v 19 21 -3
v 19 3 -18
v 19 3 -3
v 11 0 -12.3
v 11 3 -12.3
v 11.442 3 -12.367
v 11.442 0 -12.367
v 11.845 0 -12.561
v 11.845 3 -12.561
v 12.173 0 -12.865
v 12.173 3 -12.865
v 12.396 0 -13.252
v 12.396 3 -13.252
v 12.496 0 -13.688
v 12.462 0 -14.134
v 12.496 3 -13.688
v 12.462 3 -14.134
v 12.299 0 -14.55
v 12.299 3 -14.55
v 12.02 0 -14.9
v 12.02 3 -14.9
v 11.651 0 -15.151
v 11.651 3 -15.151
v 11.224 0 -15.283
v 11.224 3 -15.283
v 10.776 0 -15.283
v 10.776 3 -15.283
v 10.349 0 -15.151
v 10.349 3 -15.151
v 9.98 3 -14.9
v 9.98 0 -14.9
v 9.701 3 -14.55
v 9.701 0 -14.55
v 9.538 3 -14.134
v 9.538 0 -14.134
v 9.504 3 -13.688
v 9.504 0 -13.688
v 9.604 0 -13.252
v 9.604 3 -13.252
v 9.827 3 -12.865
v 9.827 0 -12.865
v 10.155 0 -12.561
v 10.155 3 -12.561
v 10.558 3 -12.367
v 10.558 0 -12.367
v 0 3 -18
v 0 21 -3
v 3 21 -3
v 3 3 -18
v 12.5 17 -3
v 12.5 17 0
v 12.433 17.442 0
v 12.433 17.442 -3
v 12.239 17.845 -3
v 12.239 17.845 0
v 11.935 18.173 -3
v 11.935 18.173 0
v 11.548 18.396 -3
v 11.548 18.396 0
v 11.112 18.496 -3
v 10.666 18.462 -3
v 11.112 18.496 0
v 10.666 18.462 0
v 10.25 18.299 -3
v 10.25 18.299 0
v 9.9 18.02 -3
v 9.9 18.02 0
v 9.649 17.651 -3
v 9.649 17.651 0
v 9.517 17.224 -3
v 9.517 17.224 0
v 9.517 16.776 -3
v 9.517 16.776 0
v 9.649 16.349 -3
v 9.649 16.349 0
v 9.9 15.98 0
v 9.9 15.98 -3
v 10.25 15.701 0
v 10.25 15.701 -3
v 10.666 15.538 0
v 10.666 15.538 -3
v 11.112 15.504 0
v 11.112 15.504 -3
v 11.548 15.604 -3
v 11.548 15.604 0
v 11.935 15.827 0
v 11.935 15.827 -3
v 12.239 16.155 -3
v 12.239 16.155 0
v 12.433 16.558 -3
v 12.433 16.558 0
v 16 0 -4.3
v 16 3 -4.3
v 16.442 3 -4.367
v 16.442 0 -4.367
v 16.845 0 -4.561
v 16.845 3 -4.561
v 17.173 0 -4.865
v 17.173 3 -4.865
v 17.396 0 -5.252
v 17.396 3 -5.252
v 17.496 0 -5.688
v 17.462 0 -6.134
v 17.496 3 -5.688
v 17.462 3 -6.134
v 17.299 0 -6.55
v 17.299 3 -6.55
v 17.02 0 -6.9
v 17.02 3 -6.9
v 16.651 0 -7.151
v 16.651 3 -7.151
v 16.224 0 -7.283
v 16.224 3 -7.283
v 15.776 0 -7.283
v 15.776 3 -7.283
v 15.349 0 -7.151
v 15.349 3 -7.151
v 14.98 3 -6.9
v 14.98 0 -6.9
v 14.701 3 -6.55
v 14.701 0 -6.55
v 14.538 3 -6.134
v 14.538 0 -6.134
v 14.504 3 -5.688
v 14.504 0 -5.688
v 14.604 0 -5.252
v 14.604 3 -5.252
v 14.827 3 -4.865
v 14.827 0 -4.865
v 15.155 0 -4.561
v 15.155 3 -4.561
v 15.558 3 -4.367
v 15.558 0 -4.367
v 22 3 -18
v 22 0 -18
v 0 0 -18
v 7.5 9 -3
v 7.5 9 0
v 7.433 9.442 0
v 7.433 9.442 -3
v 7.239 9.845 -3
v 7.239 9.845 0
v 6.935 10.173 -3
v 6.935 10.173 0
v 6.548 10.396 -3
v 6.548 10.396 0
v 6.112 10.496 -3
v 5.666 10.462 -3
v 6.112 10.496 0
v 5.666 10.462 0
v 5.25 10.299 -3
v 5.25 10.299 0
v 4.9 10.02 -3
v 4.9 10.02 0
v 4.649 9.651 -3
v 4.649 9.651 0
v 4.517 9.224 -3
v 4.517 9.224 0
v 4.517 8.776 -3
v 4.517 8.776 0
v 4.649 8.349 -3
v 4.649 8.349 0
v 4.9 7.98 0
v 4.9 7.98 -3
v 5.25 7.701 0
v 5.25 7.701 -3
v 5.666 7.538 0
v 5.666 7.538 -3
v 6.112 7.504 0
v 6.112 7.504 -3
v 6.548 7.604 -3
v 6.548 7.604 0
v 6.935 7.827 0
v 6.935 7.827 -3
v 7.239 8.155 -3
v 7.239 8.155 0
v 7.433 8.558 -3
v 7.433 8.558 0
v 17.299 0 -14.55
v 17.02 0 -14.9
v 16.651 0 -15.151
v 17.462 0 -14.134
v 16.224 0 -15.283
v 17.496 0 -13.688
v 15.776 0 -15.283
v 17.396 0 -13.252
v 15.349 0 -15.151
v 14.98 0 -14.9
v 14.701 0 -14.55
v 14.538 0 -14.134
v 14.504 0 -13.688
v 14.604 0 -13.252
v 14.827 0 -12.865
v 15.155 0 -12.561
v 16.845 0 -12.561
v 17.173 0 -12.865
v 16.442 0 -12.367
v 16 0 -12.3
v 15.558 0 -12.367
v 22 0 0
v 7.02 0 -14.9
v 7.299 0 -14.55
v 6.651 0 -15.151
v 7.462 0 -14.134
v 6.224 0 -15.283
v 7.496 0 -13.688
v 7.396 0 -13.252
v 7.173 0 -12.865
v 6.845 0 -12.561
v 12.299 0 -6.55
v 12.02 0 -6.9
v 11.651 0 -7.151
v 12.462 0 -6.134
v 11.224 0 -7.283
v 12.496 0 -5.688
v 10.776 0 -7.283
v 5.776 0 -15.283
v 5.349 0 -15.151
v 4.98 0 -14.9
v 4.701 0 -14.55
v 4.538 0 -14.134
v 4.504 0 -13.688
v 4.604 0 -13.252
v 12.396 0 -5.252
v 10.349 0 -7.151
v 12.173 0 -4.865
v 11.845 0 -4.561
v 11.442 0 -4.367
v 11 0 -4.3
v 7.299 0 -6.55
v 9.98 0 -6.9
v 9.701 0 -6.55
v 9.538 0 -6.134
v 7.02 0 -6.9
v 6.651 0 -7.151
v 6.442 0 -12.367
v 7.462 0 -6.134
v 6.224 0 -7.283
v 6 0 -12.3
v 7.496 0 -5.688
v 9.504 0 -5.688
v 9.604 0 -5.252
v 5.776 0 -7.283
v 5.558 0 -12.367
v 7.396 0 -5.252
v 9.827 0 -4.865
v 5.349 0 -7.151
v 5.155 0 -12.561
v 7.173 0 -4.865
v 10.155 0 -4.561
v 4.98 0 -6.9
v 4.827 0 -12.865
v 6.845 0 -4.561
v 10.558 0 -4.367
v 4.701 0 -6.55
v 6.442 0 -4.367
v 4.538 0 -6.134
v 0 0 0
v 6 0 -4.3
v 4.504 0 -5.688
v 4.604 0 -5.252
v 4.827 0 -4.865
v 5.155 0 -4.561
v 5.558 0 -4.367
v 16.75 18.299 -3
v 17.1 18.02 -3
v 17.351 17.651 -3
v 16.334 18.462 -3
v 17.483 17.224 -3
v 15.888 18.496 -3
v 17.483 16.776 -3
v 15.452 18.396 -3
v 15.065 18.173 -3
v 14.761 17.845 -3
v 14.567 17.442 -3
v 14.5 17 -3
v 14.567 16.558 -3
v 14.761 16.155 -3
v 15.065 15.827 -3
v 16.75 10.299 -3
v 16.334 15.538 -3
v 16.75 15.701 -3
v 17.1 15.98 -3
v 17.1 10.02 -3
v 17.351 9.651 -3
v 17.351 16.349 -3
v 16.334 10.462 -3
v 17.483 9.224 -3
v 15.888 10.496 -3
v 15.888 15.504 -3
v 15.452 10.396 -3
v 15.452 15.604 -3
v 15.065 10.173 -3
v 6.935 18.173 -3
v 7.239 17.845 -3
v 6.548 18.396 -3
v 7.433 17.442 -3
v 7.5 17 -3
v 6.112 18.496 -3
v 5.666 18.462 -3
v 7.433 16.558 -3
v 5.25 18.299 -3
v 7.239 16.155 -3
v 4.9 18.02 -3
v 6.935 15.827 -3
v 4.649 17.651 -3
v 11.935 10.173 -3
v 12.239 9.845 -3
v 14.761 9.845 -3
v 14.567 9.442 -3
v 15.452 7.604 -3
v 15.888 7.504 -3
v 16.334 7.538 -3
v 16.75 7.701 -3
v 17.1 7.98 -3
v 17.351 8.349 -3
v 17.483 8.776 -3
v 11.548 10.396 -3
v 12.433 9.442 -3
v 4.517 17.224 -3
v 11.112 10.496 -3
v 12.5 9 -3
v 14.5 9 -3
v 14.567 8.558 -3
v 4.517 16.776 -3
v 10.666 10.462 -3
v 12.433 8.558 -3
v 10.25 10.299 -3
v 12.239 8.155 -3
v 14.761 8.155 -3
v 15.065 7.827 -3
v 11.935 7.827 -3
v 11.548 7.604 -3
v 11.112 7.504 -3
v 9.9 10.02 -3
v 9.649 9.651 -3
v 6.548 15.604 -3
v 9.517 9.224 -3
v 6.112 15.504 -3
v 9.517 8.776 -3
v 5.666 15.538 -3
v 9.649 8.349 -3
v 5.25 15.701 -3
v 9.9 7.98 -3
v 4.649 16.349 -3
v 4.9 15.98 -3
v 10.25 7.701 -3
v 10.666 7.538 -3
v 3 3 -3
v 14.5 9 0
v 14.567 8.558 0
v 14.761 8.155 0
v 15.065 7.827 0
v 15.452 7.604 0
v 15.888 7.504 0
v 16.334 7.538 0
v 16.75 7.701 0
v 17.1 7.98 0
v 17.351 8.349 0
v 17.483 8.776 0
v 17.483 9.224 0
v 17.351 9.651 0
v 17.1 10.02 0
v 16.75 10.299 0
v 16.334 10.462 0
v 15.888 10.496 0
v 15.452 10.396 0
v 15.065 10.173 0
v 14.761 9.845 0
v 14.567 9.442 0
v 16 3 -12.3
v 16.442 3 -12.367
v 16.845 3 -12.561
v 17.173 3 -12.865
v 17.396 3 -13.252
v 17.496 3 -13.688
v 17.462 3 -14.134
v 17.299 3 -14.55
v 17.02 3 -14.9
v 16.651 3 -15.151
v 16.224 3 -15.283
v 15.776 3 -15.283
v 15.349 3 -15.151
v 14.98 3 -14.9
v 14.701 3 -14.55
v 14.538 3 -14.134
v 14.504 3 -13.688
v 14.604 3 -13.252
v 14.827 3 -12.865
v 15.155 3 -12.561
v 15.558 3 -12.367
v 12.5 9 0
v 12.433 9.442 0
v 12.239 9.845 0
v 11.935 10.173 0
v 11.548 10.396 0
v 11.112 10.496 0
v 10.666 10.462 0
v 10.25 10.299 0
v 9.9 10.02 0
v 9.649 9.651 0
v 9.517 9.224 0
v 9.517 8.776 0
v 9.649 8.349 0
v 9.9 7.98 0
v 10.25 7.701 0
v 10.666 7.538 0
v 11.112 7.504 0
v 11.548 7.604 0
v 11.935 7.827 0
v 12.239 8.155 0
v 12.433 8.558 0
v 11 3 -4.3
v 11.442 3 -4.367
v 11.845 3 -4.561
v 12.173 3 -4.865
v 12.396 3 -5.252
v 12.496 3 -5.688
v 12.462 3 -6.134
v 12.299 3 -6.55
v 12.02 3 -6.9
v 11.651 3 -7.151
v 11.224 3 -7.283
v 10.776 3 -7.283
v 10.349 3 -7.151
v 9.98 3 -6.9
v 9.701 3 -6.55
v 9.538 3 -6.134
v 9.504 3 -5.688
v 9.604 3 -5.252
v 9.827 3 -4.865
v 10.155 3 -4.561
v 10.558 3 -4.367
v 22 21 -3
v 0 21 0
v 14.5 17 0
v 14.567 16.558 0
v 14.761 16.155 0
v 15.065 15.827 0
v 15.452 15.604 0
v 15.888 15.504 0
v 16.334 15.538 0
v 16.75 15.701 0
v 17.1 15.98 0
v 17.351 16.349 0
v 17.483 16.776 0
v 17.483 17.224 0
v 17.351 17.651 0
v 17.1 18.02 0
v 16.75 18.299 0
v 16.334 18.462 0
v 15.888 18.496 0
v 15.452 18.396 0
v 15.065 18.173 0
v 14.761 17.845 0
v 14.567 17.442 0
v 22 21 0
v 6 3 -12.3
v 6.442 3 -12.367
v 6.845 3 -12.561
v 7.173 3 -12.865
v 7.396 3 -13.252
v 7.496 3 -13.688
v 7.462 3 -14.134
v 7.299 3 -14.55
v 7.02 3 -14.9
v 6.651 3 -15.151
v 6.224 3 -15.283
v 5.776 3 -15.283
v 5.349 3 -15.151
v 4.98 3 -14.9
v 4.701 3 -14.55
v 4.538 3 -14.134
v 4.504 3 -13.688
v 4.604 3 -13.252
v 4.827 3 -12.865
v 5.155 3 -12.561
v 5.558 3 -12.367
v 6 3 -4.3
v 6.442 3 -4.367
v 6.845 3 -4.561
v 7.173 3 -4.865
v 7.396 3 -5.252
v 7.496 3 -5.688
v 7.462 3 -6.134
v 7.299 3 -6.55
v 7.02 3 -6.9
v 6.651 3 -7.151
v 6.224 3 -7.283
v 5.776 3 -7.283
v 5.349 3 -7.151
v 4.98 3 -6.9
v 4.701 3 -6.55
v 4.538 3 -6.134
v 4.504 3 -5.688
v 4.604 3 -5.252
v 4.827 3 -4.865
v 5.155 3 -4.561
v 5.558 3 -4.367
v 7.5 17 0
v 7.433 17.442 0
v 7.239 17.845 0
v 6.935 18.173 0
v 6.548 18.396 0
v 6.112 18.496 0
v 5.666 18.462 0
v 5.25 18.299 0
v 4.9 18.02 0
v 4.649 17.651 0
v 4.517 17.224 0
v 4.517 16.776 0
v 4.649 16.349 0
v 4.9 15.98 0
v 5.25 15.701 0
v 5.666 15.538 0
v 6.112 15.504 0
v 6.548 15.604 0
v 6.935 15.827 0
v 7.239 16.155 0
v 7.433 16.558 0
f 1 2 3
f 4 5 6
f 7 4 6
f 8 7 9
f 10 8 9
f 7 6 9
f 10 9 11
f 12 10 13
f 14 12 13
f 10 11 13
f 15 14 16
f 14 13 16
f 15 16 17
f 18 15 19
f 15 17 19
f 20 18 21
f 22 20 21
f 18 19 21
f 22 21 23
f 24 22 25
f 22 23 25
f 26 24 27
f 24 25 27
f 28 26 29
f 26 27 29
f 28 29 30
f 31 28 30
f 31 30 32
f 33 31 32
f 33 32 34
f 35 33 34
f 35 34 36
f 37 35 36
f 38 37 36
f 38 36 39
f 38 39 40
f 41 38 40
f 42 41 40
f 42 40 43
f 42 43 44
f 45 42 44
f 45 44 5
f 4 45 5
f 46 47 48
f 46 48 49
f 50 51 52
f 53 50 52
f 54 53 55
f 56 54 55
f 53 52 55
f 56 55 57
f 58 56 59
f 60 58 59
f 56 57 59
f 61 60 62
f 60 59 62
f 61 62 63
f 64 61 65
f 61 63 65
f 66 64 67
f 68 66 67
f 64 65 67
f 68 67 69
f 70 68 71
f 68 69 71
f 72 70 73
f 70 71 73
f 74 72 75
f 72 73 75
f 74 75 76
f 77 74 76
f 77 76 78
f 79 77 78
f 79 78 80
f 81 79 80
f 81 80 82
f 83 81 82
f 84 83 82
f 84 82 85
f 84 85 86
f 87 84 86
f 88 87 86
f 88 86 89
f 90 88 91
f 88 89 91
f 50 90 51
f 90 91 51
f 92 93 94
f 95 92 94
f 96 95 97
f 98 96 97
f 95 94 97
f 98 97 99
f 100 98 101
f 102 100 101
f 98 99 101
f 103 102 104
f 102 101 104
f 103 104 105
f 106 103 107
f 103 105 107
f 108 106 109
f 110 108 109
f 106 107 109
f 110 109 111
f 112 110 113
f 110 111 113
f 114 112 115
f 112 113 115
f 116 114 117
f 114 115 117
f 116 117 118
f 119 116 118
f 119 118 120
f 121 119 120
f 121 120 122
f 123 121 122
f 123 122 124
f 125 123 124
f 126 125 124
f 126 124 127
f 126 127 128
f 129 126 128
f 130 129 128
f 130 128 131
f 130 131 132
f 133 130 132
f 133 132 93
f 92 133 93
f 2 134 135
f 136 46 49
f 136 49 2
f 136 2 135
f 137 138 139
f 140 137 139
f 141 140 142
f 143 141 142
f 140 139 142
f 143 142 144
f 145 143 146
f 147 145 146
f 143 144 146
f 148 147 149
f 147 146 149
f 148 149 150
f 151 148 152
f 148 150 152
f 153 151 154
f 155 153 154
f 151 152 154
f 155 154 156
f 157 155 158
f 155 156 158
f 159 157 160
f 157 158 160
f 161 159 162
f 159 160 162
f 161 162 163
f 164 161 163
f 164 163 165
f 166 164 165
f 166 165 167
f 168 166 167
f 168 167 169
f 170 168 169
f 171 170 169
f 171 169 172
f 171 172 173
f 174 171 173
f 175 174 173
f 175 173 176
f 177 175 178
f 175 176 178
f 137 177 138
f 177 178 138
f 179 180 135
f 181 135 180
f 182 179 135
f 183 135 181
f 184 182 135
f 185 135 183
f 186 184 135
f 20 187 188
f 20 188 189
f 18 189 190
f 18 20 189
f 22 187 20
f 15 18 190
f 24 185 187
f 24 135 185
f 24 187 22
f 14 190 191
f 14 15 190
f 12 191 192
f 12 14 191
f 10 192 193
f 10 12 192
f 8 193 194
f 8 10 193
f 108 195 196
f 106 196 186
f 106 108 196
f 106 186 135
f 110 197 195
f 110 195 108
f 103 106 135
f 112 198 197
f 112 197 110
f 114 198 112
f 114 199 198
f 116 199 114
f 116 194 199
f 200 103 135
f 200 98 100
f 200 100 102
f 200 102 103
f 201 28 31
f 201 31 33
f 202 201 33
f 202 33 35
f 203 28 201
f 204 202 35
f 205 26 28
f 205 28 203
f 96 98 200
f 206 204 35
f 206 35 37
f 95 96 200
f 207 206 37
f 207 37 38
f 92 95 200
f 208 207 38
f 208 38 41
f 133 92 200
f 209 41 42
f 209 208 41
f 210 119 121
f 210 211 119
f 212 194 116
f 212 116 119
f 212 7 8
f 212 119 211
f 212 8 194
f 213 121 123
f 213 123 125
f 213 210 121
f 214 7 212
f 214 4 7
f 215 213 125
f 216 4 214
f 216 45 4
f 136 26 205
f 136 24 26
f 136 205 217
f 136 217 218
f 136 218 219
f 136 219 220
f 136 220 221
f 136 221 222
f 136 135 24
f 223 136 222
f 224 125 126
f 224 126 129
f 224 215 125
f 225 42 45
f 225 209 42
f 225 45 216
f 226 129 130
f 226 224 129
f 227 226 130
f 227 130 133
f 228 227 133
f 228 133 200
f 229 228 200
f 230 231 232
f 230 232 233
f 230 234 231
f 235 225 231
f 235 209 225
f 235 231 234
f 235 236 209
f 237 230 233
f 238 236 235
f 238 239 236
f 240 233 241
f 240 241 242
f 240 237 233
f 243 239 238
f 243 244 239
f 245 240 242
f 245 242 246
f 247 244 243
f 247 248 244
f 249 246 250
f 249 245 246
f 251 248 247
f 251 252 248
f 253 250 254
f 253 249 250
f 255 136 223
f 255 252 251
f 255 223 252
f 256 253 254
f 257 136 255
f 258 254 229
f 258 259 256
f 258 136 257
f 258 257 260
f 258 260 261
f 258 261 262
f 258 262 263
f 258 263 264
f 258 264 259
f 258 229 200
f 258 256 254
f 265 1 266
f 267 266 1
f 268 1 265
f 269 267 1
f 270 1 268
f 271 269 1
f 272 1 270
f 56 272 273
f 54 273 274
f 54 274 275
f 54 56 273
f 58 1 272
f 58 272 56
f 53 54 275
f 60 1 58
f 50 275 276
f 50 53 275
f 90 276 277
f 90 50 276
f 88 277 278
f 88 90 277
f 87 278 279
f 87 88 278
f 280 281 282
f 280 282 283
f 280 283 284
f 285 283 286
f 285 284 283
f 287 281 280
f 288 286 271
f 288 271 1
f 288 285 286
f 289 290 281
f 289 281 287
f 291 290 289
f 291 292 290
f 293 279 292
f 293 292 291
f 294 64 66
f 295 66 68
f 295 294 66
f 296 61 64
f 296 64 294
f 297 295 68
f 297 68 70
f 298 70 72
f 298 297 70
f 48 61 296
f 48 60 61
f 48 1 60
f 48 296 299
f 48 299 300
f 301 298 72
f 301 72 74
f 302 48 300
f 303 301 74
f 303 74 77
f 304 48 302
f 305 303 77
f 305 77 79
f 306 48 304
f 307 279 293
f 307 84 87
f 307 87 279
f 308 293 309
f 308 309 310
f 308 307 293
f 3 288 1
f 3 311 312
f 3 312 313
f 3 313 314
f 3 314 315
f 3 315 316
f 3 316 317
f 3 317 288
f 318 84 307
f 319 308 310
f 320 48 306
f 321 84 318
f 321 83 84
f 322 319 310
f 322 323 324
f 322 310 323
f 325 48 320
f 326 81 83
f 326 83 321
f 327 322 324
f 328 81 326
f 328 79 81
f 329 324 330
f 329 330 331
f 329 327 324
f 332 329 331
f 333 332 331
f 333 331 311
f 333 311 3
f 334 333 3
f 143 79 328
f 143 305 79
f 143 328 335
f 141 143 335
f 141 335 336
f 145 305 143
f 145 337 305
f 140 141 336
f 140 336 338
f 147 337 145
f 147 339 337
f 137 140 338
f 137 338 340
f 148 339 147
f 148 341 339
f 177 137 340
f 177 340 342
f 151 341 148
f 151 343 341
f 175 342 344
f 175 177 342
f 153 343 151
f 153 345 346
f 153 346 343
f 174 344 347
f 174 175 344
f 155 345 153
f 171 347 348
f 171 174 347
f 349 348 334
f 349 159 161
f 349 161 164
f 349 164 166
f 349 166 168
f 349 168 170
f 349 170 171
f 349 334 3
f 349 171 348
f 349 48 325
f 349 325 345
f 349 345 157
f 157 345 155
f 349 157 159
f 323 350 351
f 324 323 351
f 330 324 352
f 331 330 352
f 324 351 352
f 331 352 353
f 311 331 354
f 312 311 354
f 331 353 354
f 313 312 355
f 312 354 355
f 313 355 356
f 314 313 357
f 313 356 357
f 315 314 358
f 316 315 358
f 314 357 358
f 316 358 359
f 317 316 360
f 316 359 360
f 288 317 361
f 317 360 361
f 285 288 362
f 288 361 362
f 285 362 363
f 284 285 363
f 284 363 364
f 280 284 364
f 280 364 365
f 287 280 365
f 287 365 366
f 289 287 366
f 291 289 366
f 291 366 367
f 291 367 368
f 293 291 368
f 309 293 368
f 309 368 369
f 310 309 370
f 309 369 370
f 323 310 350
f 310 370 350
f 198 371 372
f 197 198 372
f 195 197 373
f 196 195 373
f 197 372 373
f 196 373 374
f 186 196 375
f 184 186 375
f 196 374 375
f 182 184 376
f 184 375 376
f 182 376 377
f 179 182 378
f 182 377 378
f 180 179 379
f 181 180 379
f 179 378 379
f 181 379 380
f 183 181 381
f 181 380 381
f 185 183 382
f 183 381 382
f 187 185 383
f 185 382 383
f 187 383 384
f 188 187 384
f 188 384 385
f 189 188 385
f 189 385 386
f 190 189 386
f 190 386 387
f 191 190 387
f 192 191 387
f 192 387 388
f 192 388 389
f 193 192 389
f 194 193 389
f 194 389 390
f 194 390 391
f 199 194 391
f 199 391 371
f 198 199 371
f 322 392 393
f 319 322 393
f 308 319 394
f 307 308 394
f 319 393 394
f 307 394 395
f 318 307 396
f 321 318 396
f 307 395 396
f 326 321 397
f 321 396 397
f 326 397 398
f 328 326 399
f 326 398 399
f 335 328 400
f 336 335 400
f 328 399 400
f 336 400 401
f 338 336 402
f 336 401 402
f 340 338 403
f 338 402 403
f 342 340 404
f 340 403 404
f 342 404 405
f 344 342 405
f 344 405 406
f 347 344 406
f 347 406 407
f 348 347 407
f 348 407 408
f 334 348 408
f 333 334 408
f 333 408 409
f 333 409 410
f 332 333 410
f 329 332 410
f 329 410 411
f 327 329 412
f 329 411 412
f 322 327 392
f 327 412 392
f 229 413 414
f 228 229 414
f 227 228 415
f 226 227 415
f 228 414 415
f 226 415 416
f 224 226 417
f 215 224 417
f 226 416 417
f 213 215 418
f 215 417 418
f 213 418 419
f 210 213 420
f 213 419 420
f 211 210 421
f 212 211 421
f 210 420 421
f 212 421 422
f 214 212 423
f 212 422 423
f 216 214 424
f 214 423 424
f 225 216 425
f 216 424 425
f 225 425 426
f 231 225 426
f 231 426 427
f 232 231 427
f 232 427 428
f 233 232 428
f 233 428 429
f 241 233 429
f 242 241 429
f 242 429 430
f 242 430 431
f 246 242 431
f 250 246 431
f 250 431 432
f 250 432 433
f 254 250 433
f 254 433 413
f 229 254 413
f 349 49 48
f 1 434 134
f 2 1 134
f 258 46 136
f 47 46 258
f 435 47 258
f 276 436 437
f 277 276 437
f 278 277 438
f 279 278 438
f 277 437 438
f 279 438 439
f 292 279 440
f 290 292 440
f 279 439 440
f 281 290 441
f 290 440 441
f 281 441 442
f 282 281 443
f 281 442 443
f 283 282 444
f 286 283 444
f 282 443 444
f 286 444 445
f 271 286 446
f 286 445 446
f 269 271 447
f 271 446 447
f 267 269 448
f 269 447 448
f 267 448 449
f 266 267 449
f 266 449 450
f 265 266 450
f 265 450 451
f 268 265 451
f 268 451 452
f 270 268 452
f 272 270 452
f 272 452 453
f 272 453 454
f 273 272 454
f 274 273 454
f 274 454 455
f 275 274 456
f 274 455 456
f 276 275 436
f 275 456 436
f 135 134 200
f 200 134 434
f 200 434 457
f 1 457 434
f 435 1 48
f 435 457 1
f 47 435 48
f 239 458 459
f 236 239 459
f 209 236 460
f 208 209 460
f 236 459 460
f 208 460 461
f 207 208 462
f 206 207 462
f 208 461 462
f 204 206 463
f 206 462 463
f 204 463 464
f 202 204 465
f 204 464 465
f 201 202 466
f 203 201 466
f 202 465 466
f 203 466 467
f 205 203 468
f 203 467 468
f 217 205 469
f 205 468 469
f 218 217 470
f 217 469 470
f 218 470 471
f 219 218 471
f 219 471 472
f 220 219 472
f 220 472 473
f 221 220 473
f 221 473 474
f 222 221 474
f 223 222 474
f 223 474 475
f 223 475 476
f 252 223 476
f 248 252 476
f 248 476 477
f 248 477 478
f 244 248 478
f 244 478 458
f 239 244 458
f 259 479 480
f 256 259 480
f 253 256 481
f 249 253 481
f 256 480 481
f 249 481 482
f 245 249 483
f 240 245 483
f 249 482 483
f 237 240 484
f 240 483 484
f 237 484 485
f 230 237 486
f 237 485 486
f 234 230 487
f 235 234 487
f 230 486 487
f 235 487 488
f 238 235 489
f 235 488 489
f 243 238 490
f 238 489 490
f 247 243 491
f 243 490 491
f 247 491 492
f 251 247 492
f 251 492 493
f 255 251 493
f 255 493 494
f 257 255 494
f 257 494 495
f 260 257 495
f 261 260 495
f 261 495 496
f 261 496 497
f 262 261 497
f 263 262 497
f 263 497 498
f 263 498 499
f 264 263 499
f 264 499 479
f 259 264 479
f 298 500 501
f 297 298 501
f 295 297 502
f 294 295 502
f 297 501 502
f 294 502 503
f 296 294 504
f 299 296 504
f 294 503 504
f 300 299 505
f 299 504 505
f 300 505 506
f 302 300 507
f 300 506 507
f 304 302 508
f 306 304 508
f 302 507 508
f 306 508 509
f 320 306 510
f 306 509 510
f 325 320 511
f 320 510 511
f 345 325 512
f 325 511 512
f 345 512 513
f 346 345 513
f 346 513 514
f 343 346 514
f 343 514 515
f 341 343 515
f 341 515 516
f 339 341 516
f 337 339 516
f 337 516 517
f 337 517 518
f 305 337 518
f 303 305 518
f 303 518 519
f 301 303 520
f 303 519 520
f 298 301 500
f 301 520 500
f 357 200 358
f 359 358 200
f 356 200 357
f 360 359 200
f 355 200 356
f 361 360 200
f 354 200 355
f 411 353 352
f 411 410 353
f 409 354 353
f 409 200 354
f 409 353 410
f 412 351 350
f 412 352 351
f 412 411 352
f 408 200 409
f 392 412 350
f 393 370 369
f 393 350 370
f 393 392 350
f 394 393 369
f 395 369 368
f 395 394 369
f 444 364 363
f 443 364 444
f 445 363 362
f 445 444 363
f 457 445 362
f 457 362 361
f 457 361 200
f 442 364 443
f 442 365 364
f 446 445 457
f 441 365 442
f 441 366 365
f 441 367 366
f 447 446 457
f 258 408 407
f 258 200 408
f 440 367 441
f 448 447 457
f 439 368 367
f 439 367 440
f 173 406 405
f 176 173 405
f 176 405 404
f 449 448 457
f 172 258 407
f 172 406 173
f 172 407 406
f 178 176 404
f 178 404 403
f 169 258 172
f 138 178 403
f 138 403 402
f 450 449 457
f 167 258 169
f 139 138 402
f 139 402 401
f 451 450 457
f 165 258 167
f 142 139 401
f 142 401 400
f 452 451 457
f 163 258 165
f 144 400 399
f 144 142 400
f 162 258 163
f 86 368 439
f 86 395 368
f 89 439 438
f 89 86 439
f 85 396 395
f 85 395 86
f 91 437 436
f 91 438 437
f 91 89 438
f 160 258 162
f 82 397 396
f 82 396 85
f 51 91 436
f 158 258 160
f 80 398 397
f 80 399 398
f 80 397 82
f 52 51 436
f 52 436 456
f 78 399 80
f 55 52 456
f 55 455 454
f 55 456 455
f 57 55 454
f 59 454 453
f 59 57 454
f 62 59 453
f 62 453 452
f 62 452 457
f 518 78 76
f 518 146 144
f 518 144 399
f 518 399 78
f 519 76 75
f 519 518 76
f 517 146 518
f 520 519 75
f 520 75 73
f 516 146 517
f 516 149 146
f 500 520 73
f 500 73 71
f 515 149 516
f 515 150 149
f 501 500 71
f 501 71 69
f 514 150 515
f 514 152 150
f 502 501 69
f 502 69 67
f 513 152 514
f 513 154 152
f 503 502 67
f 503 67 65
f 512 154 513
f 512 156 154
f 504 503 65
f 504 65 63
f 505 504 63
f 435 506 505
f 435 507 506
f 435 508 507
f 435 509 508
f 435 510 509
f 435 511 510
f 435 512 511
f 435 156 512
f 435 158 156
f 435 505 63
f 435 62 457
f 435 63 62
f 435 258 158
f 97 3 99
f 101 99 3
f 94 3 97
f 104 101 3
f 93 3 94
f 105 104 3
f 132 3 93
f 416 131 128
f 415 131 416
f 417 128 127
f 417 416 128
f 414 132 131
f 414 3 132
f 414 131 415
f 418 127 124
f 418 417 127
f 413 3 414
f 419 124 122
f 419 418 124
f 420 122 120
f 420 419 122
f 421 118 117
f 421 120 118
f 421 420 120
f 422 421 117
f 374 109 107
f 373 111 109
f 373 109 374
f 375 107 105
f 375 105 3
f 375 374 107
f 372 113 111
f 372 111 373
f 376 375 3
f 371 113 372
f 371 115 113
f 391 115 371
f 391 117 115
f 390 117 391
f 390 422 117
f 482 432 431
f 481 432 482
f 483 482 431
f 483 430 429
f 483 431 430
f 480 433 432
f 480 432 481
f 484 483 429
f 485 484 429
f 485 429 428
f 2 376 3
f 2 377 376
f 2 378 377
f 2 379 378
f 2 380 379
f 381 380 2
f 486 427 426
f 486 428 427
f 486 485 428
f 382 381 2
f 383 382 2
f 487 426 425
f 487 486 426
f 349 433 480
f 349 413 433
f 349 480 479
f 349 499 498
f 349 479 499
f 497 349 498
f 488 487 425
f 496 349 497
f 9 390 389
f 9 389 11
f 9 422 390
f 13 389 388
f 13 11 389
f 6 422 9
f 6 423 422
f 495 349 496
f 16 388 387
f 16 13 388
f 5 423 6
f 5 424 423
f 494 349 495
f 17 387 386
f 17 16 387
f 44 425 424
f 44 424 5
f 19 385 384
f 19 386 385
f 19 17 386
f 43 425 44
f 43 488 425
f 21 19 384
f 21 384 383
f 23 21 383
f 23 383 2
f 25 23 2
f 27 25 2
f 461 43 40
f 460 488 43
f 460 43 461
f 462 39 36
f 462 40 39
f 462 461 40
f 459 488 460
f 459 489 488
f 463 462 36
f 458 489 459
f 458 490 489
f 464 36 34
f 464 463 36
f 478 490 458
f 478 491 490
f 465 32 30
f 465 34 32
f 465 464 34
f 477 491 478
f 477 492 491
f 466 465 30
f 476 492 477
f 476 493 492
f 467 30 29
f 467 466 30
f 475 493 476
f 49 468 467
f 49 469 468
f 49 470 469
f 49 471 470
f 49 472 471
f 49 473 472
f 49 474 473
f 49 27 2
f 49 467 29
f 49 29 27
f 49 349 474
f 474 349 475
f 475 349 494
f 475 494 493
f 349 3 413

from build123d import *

# Parameters (mm, degrees)
EXTRUDE_1_DEPTH     = 22
SKETCH_2_R          = 1.5
CUT_EXTRUDE_1_DEPTH = 13
EXTRUDE_2_DEPTH     = 3
EXTRUDE_3_DEPTH     = 3
SKETCH_5_R          = 1.5
CUT_EXTRUDE_2_DEPTH = 3


with BuildPart() as part:
    # 草图1 → 凸台-拉伸1 (new body)
    with BuildSketch(Plane(origin=(0, 0, 0), x_dir=(0, 0, -1), z_dir=(1, 0, 0))):
        Polygon((0, 0), (0, 21), (3, 21), (3, 3), (18, 3), (18, 0), align=None)
    extrude(amount=EXTRUDE_1_DEPTH)

    # 草图2 → 切除-拉伸1 (cut)
    with BuildSketch(Plane(origin=(0, 3, 0), x_dir=(1, 0, 0), z_dir=(0, 1, 0))):
        with Locations(Location((11, 5.8, 0), (0, 0, 270))):
            Circle(SKETCH_2_R)
        with Locations(Location((11, 13.8, 0), (0, 0, 270))):
            Circle(SKETCH_2_R)
        with Locations(Location((16, 5.8, 0), (0, 0, 270))):
            Circle(SKETCH_2_R)
        with Locations(Location((16, 13.8, 0), (0, 0, 270))):
            Circle(SKETCH_2_R)
        with Locations(Location((6, 13.8, 0), (0, 0, 270))):
            Circle(SKETCH_2_R)
        with Locations(Location((6, 5.8, 0), (0, 0, 270))):
            Circle(SKETCH_2_R)
    extrude(amount=-CUT_EXTRUDE_1_DEPTH, mode=Mode.SUBTRACT)

    # 草图3 → 凸台-拉伸2 (add)
    with BuildSketch(Plane(origin=(22, 0, 0), x_dir=(0, 0, -1), z_dir=(1, 0, 0))):
        Polygon((3, 21), (18, 3), (3, 3), align=None)
    extrude(amount=-EXTRUDE_2_DEPTH)

    # 草图4 → 凸台-拉伸3 (add)
    with BuildSketch(Plane.ZY):
        Polygon((-18, 3), (-3, 3), (-3, 21), align=None)
    extrude(amount=-EXTRUDE_3_DEPTH)

    # 草图5 → 切除-拉伸2 (cut)
    with BuildSketch(Plane.XY):
        with Locations((11, 17)):
            Circle(SKETCH_5_R)
        with Locations((11, 9)):
            Circle(SKETCH_5_R)
        with Locations((6, 17)):
            Circle(SKETCH_5_R)
        with Locations((6, 9)):
            Circle(SKETCH_5_R)
        with Locations(Location((16, 9, 0), (0, 0, 180))):
            Circle(SKETCH_5_R)
        with Locations(Location((16, 17, 0), (0, 0, 180))):
            Circle(SKETCH_5_R)
    extrude(amount=-CUT_EXTRUDE_2_DEPTH, mode=Mode.SUBTRACT)


solid = part.part
